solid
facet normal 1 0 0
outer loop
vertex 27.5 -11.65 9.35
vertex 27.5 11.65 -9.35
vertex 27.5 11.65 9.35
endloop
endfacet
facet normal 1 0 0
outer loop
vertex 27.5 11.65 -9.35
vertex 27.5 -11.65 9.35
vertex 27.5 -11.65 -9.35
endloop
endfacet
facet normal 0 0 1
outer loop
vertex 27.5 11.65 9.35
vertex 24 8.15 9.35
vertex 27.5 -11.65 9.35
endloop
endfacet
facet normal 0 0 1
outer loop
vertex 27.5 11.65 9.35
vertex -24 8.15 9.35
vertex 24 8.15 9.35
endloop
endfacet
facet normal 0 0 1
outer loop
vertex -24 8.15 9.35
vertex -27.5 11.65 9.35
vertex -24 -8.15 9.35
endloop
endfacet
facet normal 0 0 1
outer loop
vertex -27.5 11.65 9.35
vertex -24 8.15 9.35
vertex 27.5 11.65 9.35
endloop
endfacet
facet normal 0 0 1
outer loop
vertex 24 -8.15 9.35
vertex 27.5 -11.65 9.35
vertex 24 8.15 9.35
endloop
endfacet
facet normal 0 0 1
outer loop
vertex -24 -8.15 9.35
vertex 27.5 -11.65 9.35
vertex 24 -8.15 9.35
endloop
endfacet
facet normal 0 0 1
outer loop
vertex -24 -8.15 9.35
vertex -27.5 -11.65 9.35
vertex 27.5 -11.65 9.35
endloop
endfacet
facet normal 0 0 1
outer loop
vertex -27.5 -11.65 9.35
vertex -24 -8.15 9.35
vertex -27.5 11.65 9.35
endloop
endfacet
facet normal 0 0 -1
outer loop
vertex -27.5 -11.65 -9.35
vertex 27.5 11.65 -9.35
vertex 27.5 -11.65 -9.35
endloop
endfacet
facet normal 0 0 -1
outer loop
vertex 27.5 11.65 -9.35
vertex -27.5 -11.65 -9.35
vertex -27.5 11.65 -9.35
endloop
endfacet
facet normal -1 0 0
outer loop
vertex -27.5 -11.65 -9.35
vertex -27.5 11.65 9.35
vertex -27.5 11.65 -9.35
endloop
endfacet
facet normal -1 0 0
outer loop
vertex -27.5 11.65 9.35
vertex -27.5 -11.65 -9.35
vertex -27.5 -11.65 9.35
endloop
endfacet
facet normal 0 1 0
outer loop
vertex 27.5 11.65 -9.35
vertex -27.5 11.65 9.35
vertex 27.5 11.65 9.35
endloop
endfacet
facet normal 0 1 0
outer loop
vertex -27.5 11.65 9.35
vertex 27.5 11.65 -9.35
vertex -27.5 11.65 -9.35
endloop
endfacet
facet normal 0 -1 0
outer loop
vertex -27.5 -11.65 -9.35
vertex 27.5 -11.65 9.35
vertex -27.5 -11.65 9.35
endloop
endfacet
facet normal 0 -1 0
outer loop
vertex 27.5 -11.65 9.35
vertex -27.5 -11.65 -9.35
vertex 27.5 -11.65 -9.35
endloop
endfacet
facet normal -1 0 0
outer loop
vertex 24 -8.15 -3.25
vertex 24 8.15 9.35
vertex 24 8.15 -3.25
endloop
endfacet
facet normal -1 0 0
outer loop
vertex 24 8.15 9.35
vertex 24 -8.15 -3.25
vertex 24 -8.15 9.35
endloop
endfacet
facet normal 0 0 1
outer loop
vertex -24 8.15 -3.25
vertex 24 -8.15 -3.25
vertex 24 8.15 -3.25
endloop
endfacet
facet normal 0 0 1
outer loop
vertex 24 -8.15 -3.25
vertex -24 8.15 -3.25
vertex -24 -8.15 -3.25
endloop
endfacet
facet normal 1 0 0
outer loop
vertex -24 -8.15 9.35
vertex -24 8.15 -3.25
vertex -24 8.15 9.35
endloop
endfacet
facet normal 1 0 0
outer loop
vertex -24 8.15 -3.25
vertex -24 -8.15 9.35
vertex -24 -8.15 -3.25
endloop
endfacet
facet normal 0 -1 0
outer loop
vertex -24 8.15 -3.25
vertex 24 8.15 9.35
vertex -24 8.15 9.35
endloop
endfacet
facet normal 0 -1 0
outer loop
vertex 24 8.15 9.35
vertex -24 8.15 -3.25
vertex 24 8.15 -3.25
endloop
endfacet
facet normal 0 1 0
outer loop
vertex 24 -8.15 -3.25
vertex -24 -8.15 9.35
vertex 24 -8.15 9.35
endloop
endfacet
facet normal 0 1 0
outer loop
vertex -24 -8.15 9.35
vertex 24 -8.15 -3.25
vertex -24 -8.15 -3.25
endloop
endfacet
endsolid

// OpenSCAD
// --- TEKTONOLOGY V2: WEDGE-LOCK SYSTEM ---
// Material 1 (Upper): Polymaker PLA Pro (Rigid)
// Material 2 (Pad): TPU 90A (Flexible)

leg_l = 48.0; 
leg_w = 16.3;
lip_h = 12.7; 
wall = 3.5;
sole = 6.0;   
wedge_d = 5.0; 
tolerance = 0.2; 

$fn = 64;

module upper_boot_pla() {
    difference() {
        cube([leg_l + (wall*2), leg_w + (wall*2), lip_h + sole], center=true);
        translate([0,0, (sole/2) + 0.1]) cube([leg_l, leg_w, lip_h], center=true);
        translate([0,0, -(lip_h/2) - (sole/2) + (wedge_d/2)])
            polyhedron(
                points=[
                    [-(leg_l/2+1), -(leg_w/2+1), -wedge_d/2], [ (leg_l/2+1), -(leg_w/2+1), -wedge_d/2], 
                    [ (leg_l/2+1),  (leg_w/2+1), -wedge_d/2], [-(leg_l/2+1),  (leg_w/2+1), -wedge_d/2],
                    [-(leg_l/2+2), -(leg_w/2+2),  wedge_d/2], [ (leg_l/2+2), -(leg_w/2+2),  wedge_d/2], 
                    [ (leg_l/2+2),  (leg_w/2+2),  wedge_d/2], [-(leg_l/2+2),  (leg_w/2+2),  wedge_d/2]
                ],
                faces=[[0,1,2,3],[4,5,6,7],[0,1,5,4],[1,2,6,5],[2,3,7,6],[3,0,4,7]]
            );
    }
}

module floor_pad_tpu() {
    union() {
        translate([0,0, wedge_d/2])
            polyhedron(
                points=[
                    [-(leg_l/2+1-tolerance), -(leg_w/2+1-tolerance), -wedge_d/2], [ (leg_l/2+1-tolerance), -(leg_w/2+1-tolerance), -wedge_d/2], 
                    [ (leg_l/2+1-tolerance),  (leg_w/2+1-tolerance), -wedge_d/2], [-(leg_l/2+1-tolerance),  (leg_w/2+1-tolerance), -wedge_d/2],
                    [-(leg_l/2+2-tolerance), -(leg_w/2+2-tolerance),  wedge_d/2], [ (leg_l/2+2-tolerance), -(leg_w/2+2-tolerance),  wedge_d/2], 
                    [ (leg_l/2+2-tolerance),  (leg_w/2+2-tolerance),  wedge_d/2], [-(leg_l/2+2-tolerance),  (leg_w/2+2-tolerance),  wedge_d/2]
                ],
                faces=[[0,1,2,3],[4,5,6,7],[0,1,5,4],[1,2,6,5],[2,3,7,6],[3,0,4,7]]
            );
        translate([0,0, -2.5]) {
            difference() {
                cube([leg_l + (wall*2), leg_w + (wall*2), 5], center=true);
                for (i = [-(leg_l/2) : 4 : (leg_l/2)]) {
                    translate([i, 0, -2.0]) cube([1.5, leg_w + (wall*2) + 2, 2], center=true);
                }
            }
        }
    }
}

// Uncomment one at a time to export
upper_boot_pla();
// floor_pad_tpu();
